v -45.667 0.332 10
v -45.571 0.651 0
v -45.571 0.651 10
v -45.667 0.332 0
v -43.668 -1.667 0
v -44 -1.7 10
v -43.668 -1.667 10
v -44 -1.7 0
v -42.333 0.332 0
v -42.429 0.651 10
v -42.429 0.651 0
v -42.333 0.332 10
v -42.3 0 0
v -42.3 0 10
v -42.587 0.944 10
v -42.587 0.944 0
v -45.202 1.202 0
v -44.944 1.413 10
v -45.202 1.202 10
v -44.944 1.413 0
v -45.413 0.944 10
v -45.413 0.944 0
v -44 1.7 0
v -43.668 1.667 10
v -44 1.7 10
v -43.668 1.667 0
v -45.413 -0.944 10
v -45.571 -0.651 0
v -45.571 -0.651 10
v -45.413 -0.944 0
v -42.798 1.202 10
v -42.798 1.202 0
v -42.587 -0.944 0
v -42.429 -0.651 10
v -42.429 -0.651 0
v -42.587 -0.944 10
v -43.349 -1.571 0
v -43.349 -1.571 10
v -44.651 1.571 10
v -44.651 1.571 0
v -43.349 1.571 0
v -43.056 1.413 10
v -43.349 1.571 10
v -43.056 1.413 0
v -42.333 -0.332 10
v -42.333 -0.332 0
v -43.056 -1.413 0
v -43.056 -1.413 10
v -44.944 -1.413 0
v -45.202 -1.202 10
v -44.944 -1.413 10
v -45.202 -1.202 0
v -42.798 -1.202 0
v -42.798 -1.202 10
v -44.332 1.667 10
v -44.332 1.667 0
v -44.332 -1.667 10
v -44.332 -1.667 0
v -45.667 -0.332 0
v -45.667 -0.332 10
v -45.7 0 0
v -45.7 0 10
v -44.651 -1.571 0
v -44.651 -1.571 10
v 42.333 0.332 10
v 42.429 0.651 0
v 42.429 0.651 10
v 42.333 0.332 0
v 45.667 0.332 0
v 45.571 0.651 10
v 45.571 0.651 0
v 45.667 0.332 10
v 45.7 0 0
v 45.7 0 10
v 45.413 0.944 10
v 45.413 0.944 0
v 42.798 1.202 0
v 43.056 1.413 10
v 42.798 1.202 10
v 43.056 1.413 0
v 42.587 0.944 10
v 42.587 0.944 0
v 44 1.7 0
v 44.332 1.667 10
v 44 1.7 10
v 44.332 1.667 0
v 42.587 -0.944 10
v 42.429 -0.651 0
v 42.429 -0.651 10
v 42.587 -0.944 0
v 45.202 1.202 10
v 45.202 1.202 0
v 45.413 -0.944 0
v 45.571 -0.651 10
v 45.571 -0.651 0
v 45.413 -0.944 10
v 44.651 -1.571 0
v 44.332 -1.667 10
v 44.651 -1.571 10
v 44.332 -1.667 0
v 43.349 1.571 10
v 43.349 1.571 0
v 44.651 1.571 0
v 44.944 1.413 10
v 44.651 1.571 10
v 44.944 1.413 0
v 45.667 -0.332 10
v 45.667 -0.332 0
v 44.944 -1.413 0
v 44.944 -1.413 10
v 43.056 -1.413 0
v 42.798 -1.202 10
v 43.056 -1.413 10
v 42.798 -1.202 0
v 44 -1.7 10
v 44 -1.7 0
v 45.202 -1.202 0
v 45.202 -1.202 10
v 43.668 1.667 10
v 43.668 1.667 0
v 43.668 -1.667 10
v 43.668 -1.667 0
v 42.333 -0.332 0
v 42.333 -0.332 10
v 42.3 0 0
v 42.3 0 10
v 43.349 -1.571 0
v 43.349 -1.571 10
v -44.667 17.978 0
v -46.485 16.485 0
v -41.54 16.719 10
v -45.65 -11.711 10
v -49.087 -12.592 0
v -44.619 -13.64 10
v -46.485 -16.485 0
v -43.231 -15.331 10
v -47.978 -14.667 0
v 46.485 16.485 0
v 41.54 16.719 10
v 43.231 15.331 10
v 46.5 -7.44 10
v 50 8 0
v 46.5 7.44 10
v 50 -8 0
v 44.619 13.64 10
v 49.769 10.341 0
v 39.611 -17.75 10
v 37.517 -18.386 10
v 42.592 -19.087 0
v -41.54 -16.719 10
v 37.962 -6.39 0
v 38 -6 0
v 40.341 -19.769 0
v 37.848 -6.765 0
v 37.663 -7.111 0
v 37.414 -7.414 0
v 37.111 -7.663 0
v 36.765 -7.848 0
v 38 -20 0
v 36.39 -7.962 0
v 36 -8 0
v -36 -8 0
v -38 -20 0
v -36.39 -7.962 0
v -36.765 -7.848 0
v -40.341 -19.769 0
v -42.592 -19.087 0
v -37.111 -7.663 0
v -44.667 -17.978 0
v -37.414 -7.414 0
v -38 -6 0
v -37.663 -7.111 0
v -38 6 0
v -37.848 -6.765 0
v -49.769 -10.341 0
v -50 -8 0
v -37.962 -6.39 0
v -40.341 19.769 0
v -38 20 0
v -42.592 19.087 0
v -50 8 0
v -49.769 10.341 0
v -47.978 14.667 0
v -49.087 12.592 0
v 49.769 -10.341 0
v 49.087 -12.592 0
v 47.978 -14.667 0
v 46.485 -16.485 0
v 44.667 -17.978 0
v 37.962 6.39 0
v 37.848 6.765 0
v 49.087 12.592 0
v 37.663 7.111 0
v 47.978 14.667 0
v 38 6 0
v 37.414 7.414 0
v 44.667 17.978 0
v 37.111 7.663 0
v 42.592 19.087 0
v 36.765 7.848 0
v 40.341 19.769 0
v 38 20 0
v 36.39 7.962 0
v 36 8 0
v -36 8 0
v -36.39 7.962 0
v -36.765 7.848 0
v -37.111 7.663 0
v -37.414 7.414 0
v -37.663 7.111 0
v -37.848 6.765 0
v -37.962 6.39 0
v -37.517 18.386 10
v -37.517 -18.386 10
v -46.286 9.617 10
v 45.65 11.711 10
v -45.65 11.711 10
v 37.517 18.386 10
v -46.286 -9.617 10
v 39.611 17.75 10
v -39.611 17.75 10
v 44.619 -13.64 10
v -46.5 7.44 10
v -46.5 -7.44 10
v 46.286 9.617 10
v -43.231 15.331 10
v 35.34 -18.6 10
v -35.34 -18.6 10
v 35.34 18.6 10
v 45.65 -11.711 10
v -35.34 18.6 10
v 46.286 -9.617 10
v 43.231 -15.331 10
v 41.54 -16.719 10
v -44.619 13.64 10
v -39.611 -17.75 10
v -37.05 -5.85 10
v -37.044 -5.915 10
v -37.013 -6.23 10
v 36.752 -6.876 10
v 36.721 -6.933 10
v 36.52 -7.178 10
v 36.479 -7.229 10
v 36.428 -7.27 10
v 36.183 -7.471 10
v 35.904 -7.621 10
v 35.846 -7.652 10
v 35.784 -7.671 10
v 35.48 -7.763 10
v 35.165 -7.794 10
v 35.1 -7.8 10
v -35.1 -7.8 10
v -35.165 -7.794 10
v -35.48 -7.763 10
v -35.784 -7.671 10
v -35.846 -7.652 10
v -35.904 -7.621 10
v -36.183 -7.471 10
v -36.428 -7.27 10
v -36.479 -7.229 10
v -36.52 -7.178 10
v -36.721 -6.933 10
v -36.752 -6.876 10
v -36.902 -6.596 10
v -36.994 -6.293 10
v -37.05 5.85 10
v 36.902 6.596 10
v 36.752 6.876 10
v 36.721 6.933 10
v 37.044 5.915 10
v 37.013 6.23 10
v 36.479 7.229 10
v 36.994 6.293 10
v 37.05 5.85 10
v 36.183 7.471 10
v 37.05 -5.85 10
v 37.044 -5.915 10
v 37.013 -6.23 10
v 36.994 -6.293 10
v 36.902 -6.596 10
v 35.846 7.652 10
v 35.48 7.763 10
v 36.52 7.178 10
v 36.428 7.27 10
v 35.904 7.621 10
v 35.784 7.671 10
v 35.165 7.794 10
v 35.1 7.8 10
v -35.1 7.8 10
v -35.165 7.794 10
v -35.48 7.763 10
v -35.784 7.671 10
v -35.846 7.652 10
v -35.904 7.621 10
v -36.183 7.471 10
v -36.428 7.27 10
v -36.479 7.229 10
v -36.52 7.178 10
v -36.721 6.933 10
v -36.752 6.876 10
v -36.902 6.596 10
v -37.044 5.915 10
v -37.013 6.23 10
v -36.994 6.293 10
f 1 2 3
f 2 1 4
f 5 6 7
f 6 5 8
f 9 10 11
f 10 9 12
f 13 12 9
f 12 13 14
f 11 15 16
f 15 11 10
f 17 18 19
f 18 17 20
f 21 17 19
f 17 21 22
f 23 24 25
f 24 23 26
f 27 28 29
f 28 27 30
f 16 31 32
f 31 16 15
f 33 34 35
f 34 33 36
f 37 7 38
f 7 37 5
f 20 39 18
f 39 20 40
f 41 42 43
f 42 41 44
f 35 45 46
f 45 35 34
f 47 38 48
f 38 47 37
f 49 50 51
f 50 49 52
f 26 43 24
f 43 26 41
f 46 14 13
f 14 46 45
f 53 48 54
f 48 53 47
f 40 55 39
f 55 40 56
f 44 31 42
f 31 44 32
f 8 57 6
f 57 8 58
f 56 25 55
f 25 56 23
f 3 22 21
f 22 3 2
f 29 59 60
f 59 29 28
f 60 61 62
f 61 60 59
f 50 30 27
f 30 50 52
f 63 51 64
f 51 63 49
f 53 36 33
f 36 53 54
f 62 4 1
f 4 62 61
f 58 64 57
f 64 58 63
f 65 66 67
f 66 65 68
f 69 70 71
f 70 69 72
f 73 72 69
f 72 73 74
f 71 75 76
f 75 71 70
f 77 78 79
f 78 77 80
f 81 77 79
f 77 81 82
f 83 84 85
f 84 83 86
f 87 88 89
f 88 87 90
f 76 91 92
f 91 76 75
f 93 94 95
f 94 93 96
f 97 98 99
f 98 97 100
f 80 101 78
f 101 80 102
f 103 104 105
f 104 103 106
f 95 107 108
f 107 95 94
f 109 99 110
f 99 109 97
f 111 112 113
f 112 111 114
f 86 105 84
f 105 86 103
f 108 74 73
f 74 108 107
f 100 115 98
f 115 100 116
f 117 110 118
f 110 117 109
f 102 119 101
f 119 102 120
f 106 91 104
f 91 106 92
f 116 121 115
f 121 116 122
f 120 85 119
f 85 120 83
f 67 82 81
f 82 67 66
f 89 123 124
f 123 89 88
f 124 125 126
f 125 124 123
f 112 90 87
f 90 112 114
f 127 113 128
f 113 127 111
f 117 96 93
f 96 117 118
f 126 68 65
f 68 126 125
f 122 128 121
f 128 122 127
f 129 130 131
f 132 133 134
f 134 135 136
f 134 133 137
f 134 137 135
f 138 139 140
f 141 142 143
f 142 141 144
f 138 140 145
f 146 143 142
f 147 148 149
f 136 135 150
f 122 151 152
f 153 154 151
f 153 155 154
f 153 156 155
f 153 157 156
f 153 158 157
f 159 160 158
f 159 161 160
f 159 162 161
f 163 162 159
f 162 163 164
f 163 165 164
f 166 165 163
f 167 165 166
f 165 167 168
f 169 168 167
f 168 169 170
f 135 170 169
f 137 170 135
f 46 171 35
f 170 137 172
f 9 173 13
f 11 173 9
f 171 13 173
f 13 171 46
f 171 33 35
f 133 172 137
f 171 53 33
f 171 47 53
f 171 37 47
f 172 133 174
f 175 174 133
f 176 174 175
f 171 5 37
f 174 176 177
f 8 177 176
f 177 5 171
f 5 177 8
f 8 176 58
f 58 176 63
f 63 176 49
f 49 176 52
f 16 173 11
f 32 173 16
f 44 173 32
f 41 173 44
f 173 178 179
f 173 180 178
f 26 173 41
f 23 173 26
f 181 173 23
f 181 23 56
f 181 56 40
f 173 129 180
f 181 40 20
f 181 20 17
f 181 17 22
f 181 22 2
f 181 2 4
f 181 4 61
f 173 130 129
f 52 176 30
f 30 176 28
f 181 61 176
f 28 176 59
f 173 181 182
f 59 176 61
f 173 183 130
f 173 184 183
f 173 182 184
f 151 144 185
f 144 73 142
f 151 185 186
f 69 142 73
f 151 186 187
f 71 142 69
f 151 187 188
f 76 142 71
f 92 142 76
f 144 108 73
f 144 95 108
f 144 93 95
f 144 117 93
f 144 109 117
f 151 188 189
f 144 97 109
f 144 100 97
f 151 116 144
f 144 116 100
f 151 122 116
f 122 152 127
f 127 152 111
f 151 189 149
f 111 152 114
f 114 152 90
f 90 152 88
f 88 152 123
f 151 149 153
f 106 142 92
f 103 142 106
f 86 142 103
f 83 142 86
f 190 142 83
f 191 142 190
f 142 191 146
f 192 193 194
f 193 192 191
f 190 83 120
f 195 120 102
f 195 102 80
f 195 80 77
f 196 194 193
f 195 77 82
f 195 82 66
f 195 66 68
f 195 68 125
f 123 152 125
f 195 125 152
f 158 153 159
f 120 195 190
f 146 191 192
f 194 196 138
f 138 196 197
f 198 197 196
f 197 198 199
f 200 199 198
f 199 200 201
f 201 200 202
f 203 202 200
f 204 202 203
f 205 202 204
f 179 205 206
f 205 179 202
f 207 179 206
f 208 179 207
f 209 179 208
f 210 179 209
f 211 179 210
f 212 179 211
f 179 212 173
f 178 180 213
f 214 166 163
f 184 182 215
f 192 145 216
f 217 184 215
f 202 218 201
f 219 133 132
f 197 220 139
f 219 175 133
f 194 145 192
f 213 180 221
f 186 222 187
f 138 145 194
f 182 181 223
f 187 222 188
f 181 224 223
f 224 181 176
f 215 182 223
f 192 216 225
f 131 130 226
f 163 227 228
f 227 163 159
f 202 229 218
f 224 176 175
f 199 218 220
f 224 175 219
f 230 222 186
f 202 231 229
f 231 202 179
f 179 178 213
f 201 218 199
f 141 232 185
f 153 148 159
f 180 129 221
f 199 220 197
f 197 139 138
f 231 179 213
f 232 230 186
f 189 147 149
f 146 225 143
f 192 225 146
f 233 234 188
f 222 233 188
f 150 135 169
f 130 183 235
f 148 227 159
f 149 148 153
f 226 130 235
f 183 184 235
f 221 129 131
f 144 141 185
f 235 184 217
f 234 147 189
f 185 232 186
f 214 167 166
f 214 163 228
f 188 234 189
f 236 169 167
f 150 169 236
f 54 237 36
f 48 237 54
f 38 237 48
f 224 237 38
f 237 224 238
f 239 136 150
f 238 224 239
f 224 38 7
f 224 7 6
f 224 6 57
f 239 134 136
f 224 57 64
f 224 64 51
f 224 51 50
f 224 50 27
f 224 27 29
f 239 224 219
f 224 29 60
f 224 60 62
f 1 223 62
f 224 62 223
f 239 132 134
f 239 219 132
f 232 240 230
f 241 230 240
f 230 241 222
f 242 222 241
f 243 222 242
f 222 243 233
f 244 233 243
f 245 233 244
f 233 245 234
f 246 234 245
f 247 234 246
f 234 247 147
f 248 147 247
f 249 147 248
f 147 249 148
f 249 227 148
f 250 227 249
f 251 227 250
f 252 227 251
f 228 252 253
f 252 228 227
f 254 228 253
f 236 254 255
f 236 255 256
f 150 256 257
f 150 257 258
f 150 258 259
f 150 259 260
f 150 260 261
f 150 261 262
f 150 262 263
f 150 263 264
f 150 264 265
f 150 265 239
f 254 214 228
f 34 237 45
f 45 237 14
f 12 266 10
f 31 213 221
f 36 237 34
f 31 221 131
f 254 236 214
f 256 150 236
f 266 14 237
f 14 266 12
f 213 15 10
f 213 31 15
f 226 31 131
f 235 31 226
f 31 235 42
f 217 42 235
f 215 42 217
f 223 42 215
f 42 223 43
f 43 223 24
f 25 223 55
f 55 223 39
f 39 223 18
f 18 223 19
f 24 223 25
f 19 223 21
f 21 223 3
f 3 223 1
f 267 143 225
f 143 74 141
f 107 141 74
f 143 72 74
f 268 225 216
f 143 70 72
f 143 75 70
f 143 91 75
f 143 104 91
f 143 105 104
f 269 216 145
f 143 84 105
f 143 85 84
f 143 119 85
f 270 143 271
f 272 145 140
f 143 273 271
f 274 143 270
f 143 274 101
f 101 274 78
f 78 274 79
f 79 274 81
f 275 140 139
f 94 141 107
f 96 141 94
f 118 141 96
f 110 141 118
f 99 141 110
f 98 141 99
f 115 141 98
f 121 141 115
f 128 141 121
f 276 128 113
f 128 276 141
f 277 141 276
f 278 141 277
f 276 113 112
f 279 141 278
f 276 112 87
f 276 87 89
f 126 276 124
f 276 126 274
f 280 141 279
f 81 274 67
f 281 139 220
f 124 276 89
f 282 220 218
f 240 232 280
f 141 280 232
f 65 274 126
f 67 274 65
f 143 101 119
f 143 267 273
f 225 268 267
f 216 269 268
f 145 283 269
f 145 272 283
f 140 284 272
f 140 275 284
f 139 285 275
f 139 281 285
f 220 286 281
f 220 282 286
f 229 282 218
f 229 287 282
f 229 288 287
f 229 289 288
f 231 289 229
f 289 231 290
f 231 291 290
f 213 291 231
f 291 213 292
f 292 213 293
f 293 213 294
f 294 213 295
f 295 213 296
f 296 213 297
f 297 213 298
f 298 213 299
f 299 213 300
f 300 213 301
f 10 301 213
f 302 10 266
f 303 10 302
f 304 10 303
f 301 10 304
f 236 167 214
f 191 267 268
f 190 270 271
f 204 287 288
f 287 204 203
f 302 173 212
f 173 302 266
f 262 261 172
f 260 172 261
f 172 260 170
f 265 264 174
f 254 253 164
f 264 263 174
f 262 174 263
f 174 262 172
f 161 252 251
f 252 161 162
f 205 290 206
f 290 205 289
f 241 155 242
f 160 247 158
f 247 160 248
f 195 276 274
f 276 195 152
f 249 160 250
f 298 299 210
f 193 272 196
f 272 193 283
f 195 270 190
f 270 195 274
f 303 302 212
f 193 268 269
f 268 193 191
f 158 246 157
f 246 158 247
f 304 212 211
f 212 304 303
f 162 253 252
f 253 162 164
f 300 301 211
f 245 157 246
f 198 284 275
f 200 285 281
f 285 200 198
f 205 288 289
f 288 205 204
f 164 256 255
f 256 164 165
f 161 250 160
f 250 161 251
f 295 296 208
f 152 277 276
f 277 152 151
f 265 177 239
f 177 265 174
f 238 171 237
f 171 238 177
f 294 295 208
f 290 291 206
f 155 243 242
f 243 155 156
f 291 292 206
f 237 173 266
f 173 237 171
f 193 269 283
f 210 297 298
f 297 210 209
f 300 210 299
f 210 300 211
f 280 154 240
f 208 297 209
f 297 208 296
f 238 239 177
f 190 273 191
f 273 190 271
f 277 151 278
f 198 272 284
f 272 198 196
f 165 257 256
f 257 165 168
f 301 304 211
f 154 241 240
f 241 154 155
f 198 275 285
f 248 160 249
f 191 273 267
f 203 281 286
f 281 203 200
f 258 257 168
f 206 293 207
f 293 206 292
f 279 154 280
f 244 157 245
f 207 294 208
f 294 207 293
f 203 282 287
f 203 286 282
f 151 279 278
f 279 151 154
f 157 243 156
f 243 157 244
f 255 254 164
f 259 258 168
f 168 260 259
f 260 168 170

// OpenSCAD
$fn = 32;

// ----------------------------------------------------------------------
// Display bezel: 100 x 40 mm frame, opening 76x16 mm
// ----------------------------------------------------------------------

// --- parameters (mm) ---
length = 100;             // frame outside length, X
width = 40;               // frame outside width, Y
frame_w = 12;             // frame width
thickness = 10;           // frame thickness
corner_r = 12;            // outside corner radius
chamfer = 0.93;           // outer wall taper
funnel = 0.97;            // inner opening taper
opening_l = 76;           // opening length
opening_w = 16;           // opening width
inner_r = 2;              // opening corner radius
hole_d = 3.4;             // mounting screw clearance
holes_per_side = 1;       // holes per short side
hole_inset = 6;           // hole centre inset from the outside edge

/* rounded-rectangle outlines, generated with loops */
module rounded_ring(l_nom, w_nom, r) {
  hull() {
    for (sx = [-1, 1]) for (sy = [-1, 1])
      translate([sx * (l_nom / 2 - r), sy * (w_nom / 2 - r)]) circle(r = r);
  }
}

difference() {
  /* frame body, drafted so the outer edge is a variable-depth chamfer */
  linear_extrude(height = thickness, scale = chamfer)
    rounded_ring(length, width, corner_r);
  /* viewing opening, drafted the other way for a funnel edge */
  linear_extrude(height = thickness + 2, scale = funnel)
    translate([0, 0, -1]) rounded_ring(opening_l, opening_w, inner_r);
  /* mounting screws through the frame lands */
  for (sx = [-1, 1]) for (i = [1 : holes_per_side])
    translate([sx * (length / 2 - hole_inset),
               (i - (holes_per_side + 1) / 2) * width * 0.5, -1])
      cylinder(h = thickness + 2, d = hole_d);
}
